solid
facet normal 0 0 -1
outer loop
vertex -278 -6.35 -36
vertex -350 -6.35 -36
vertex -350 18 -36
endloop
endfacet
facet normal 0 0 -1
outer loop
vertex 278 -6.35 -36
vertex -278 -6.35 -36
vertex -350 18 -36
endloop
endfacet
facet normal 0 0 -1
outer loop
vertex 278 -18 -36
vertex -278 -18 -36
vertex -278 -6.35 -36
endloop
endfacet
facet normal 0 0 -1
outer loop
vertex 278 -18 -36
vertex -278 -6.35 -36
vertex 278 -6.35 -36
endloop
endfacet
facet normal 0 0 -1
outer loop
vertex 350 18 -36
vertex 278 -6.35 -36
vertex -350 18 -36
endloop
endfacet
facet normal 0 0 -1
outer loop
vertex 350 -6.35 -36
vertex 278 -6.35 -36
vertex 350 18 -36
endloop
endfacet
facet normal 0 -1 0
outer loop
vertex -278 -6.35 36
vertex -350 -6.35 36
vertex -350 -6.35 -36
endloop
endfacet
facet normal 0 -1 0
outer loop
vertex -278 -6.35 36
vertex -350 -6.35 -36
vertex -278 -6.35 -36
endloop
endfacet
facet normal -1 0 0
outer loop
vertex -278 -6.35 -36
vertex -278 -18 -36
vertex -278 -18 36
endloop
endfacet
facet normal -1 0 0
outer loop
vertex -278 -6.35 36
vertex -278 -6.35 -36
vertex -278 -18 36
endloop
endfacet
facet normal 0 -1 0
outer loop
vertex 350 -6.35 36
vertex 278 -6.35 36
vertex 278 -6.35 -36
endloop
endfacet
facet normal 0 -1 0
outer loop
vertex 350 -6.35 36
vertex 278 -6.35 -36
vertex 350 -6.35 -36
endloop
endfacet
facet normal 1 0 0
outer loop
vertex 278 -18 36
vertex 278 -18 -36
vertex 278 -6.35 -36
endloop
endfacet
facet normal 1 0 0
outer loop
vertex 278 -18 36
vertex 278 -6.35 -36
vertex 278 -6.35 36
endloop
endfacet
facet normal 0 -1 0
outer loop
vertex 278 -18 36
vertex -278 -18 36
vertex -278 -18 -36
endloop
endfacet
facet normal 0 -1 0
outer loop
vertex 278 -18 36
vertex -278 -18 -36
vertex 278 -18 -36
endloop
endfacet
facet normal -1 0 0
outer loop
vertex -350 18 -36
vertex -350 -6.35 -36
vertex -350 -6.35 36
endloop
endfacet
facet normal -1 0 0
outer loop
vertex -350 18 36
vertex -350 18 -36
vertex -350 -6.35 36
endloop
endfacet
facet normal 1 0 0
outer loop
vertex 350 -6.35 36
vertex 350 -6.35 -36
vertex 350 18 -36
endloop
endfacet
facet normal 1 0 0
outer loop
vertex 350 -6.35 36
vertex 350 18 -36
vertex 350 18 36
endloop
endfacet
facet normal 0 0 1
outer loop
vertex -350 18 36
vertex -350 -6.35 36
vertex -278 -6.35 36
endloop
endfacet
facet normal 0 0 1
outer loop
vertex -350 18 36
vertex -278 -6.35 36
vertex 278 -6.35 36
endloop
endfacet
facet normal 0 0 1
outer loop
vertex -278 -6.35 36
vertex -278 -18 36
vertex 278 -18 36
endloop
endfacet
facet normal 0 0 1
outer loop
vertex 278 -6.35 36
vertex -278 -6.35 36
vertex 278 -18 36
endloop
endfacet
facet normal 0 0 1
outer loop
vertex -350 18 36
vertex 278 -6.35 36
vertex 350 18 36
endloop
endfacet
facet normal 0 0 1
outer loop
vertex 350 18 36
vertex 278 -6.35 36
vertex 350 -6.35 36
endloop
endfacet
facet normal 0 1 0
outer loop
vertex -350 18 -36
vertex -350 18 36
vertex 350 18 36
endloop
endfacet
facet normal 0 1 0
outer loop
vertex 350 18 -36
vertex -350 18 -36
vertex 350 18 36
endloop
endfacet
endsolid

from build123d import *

# Parameters (mm, degrees)
F0_W     = 700
F0_H     = 72
F1_DEPTH = 18
F2_W     = 72
F2_H     = 72
F3_DEPTH = 11.65


with BuildPart() as f1:
    # F0 (on Front) → F1 (new body, symmetric)
    with BuildSketch(Plane.XZ):
        Rectangle(F0_W, F0_H)
    extrude(amount=F1_DEPTH, both=True)

    # F2 (on face) → F3 (cut)
    with BuildSketch(Plane.XZ.offset(18)):
        with Locations((-314, 0)):
            Rectangle(F2_W, F2_H)
        with Locations((314, 0)):
            Rectangle(F2_W, F2_H)
    extrude(amount=-F3_DEPTH, mode=Mode.SUBTRACT)


solid = f1.part
